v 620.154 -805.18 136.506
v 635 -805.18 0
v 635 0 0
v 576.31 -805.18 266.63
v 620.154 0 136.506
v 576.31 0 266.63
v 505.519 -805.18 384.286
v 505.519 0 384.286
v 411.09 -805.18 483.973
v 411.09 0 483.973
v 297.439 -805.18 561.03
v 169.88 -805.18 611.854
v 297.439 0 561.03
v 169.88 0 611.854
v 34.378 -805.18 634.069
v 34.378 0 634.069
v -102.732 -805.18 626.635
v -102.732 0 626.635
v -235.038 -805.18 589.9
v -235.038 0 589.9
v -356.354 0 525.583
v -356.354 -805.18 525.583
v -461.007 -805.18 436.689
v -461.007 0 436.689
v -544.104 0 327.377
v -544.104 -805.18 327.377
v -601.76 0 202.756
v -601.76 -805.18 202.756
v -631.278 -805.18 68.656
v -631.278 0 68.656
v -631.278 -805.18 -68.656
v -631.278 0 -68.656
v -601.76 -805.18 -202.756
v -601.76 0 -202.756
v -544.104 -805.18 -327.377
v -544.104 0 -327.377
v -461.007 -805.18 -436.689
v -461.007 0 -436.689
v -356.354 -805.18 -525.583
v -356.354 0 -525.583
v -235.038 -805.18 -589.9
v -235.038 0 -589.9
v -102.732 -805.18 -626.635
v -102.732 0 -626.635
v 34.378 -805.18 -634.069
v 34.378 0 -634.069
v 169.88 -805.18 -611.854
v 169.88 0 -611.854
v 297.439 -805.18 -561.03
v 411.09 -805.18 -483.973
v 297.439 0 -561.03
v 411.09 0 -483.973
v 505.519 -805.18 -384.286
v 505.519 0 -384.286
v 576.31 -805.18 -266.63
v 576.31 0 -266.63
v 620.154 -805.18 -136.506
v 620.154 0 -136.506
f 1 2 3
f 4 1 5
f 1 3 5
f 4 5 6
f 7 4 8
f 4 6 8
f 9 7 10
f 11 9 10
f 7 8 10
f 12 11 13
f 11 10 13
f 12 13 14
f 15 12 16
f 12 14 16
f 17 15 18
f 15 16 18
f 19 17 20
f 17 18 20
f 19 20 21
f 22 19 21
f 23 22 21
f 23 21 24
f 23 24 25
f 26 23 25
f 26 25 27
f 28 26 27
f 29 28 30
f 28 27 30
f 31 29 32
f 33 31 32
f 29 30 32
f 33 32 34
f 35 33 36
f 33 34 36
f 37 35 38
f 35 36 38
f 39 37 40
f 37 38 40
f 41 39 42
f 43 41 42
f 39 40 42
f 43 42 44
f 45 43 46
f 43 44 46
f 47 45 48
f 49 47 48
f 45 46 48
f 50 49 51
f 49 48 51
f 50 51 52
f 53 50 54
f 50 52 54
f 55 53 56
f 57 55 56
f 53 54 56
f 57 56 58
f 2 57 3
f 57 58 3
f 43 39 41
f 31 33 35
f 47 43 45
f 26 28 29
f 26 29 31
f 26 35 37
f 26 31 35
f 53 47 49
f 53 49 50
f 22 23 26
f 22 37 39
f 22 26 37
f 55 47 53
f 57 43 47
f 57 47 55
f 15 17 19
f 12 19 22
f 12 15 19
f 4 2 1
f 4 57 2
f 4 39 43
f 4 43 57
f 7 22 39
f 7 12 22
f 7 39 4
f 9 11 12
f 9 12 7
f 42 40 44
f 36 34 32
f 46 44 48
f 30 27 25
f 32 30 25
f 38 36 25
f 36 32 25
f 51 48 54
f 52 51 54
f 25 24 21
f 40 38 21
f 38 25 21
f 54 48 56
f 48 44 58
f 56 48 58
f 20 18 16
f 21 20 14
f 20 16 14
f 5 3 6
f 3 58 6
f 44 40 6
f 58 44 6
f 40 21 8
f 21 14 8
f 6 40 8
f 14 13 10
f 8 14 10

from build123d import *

# Parameters (mm, degrees)
F0_W     = 46.8510227791
F0_H     = 10.859509725
F1_DEPTH = 68.326
F2_DEPTH = 25.4
F4_R     = 635
F5_DEPTH = 805.18


with BuildPart() as f1:
    # F0 (on Front) → F1 (new body)
    with BuildSketch(Plane.XZ):
        with BuildLine():
            Line((0, 19.9349565315), (0, 0))
            Line((0, 0), (35.5261108433, 0))
            Line((35.5261108433, 0), (35.5261108433, 2.7486670447))
            ThreePointArc((35.5261108433, 2.7486670447), (31.9945535762, 7.7510571327), (35.5261108433, 12.7534472207))
            Line((35.5261108433, 12.7534472207), (35.5261108433, 13.7660977894))
            ThreePointArc((35.5261108433, 13.7660977894), (34.1369679811, 16.9197345446), (32.468561842, 19.9349565315))
            Line((32.468561842, 19.9349565315), (0, 19.9349565315))
        make_face()
        with Locations((-6.2054333332, -14.9706080555)):
            Rectangle(F0_W, F0_H)
        Polygon((35.5261108433, 0), (0, 0), (0, 19.9349565315), (-29.6309447227, -9.540853193), (17.2200780563, -9.540853193), align=None)
    extrude(amount=F1_DEPTH)

    # F0 (on Front) → F2 (join)
    with BuildSketch(Plane.XZ):
        with BuildLine():
            Line((0, 19.9349565315), (0, 0))
            Line((0, 0), (35.5261108433, 0))
            Line((35.5261108433, 0), (35.5261108433, 2.7486670447))
            ThreePointArc((35.5261108433, 2.7486670447), (31.9945535762, 7.7510571327), (35.5261108433, 12.7534472207))
            Line((35.5261108433, 12.7534472207), (35.5261108433, 13.7660977894))
            ThreePointArc((35.5261108433, 13.7660977894), (34.1369679811, 16.9197345446), (32.468561842, 19.9349565315))
            Line((32.468561842, 19.9349565315), (0, 19.9349565315))
        make_face()
        with BuildLine():
            Line((35.5261108433, 2.7486670447), (35.5261108433, 0))
            Line((35.5261108433, 0), (17.2200780563, -9.540853193))
            Line((17.2200780563, -9.540853193), (17.2200780563, -20.400362918))
            Line((17.2200780563, -20.400362918), (-29.6309447227, -20.400362918))
            Line((-29.6309447227, -20.400362918), (-29.6309447227, -9.540853193))
            Line((-29.6309447227, -9.540853193), (0, 19.9349565315))
            Line((0, 19.9349565315), (32.468561842, 19.9349565315))
            ThreePointArc((32.468561842, 19.9349565315), (-36.6651210702, -10.3575526506), (38.1, 0))
            ThreePointArc((38.1, 0), (38.0796183926, 1.2460590178), (38.0184953766, 2.4907848763))
            ThreePointArc((38.0184953766, 2.4907848763), (36.7568701316, 2.4705690147), (35.5261108433, 2.7486670447))
        make_face()
        with BuildLine():
            Line((35.5261108433, 12.7534472207), (35.5261108433, 2.7486670447))
            ThreePointArc((35.5261108433, 2.7486670447), (36.7568701316, 2.4705690147), (38.0184953766, 2.4907848763))
            ThreePointArc((38.0184953766, 2.4907848763), (37.3032319421, 7.7510571327), (35.8637504709, 12.8608476456))
            ThreePointArc((35.8637504709, 12.8608476456), (35.6940343979, 12.8099650441), (35.5261108433, 12.7534472207))
        make_face()
        with BuildLine():
            Line((35.5261108433, 19.9349565315), (32.468561842, 19.9349565315))
            ThreePointArc((32.468561842, 19.9349565315), (34.1369679811, 16.9197345446), (35.5261108433, 13.7660977894))
            Line((35.5261108433, 13.7660977894), (35.5261108433, 19.9349565315))
        make_face()
        with BuildLine():
            Line((35.5261108433, 13.7660977894), (35.5261108433, 12.7534472207))
            ThreePointArc((35.5261108433, 12.7534472207), (35.6940343979, 12.8099650441), (35.8637504709, 12.8608476456))
            ThreePointArc((35.8637504709, 12.8608476456), (35.6978002694, 13.3145430237), (35.5261108433, 13.7660977894))
        make_face()
        with BuildLine():
            ThreePointArc((35.8637504709, 12.8608476456), (37.3032319421, 7.7510571327), (38.0184953766, 2.4907848763))
            ThreePointArc((38.0184953766, 2.4907848763), (41.3019298247, 4.2592837672), (42.611910308, 7.7510571327))
            ThreePointArc((42.611910308, 7.7510571327), (40.5079411214, 11.9833029984), (35.8637504709, 12.8608476456))
        make_face()
    extrude(amount=F2_DEPTH)


with BuildPart() as f5:
    # F4 (on Front) → F5 (new body)
    with BuildSketch(Plane.XZ):
        Circle(F4_R)
    extrude(amount=F5_DEPTH)


solid = f5.part
